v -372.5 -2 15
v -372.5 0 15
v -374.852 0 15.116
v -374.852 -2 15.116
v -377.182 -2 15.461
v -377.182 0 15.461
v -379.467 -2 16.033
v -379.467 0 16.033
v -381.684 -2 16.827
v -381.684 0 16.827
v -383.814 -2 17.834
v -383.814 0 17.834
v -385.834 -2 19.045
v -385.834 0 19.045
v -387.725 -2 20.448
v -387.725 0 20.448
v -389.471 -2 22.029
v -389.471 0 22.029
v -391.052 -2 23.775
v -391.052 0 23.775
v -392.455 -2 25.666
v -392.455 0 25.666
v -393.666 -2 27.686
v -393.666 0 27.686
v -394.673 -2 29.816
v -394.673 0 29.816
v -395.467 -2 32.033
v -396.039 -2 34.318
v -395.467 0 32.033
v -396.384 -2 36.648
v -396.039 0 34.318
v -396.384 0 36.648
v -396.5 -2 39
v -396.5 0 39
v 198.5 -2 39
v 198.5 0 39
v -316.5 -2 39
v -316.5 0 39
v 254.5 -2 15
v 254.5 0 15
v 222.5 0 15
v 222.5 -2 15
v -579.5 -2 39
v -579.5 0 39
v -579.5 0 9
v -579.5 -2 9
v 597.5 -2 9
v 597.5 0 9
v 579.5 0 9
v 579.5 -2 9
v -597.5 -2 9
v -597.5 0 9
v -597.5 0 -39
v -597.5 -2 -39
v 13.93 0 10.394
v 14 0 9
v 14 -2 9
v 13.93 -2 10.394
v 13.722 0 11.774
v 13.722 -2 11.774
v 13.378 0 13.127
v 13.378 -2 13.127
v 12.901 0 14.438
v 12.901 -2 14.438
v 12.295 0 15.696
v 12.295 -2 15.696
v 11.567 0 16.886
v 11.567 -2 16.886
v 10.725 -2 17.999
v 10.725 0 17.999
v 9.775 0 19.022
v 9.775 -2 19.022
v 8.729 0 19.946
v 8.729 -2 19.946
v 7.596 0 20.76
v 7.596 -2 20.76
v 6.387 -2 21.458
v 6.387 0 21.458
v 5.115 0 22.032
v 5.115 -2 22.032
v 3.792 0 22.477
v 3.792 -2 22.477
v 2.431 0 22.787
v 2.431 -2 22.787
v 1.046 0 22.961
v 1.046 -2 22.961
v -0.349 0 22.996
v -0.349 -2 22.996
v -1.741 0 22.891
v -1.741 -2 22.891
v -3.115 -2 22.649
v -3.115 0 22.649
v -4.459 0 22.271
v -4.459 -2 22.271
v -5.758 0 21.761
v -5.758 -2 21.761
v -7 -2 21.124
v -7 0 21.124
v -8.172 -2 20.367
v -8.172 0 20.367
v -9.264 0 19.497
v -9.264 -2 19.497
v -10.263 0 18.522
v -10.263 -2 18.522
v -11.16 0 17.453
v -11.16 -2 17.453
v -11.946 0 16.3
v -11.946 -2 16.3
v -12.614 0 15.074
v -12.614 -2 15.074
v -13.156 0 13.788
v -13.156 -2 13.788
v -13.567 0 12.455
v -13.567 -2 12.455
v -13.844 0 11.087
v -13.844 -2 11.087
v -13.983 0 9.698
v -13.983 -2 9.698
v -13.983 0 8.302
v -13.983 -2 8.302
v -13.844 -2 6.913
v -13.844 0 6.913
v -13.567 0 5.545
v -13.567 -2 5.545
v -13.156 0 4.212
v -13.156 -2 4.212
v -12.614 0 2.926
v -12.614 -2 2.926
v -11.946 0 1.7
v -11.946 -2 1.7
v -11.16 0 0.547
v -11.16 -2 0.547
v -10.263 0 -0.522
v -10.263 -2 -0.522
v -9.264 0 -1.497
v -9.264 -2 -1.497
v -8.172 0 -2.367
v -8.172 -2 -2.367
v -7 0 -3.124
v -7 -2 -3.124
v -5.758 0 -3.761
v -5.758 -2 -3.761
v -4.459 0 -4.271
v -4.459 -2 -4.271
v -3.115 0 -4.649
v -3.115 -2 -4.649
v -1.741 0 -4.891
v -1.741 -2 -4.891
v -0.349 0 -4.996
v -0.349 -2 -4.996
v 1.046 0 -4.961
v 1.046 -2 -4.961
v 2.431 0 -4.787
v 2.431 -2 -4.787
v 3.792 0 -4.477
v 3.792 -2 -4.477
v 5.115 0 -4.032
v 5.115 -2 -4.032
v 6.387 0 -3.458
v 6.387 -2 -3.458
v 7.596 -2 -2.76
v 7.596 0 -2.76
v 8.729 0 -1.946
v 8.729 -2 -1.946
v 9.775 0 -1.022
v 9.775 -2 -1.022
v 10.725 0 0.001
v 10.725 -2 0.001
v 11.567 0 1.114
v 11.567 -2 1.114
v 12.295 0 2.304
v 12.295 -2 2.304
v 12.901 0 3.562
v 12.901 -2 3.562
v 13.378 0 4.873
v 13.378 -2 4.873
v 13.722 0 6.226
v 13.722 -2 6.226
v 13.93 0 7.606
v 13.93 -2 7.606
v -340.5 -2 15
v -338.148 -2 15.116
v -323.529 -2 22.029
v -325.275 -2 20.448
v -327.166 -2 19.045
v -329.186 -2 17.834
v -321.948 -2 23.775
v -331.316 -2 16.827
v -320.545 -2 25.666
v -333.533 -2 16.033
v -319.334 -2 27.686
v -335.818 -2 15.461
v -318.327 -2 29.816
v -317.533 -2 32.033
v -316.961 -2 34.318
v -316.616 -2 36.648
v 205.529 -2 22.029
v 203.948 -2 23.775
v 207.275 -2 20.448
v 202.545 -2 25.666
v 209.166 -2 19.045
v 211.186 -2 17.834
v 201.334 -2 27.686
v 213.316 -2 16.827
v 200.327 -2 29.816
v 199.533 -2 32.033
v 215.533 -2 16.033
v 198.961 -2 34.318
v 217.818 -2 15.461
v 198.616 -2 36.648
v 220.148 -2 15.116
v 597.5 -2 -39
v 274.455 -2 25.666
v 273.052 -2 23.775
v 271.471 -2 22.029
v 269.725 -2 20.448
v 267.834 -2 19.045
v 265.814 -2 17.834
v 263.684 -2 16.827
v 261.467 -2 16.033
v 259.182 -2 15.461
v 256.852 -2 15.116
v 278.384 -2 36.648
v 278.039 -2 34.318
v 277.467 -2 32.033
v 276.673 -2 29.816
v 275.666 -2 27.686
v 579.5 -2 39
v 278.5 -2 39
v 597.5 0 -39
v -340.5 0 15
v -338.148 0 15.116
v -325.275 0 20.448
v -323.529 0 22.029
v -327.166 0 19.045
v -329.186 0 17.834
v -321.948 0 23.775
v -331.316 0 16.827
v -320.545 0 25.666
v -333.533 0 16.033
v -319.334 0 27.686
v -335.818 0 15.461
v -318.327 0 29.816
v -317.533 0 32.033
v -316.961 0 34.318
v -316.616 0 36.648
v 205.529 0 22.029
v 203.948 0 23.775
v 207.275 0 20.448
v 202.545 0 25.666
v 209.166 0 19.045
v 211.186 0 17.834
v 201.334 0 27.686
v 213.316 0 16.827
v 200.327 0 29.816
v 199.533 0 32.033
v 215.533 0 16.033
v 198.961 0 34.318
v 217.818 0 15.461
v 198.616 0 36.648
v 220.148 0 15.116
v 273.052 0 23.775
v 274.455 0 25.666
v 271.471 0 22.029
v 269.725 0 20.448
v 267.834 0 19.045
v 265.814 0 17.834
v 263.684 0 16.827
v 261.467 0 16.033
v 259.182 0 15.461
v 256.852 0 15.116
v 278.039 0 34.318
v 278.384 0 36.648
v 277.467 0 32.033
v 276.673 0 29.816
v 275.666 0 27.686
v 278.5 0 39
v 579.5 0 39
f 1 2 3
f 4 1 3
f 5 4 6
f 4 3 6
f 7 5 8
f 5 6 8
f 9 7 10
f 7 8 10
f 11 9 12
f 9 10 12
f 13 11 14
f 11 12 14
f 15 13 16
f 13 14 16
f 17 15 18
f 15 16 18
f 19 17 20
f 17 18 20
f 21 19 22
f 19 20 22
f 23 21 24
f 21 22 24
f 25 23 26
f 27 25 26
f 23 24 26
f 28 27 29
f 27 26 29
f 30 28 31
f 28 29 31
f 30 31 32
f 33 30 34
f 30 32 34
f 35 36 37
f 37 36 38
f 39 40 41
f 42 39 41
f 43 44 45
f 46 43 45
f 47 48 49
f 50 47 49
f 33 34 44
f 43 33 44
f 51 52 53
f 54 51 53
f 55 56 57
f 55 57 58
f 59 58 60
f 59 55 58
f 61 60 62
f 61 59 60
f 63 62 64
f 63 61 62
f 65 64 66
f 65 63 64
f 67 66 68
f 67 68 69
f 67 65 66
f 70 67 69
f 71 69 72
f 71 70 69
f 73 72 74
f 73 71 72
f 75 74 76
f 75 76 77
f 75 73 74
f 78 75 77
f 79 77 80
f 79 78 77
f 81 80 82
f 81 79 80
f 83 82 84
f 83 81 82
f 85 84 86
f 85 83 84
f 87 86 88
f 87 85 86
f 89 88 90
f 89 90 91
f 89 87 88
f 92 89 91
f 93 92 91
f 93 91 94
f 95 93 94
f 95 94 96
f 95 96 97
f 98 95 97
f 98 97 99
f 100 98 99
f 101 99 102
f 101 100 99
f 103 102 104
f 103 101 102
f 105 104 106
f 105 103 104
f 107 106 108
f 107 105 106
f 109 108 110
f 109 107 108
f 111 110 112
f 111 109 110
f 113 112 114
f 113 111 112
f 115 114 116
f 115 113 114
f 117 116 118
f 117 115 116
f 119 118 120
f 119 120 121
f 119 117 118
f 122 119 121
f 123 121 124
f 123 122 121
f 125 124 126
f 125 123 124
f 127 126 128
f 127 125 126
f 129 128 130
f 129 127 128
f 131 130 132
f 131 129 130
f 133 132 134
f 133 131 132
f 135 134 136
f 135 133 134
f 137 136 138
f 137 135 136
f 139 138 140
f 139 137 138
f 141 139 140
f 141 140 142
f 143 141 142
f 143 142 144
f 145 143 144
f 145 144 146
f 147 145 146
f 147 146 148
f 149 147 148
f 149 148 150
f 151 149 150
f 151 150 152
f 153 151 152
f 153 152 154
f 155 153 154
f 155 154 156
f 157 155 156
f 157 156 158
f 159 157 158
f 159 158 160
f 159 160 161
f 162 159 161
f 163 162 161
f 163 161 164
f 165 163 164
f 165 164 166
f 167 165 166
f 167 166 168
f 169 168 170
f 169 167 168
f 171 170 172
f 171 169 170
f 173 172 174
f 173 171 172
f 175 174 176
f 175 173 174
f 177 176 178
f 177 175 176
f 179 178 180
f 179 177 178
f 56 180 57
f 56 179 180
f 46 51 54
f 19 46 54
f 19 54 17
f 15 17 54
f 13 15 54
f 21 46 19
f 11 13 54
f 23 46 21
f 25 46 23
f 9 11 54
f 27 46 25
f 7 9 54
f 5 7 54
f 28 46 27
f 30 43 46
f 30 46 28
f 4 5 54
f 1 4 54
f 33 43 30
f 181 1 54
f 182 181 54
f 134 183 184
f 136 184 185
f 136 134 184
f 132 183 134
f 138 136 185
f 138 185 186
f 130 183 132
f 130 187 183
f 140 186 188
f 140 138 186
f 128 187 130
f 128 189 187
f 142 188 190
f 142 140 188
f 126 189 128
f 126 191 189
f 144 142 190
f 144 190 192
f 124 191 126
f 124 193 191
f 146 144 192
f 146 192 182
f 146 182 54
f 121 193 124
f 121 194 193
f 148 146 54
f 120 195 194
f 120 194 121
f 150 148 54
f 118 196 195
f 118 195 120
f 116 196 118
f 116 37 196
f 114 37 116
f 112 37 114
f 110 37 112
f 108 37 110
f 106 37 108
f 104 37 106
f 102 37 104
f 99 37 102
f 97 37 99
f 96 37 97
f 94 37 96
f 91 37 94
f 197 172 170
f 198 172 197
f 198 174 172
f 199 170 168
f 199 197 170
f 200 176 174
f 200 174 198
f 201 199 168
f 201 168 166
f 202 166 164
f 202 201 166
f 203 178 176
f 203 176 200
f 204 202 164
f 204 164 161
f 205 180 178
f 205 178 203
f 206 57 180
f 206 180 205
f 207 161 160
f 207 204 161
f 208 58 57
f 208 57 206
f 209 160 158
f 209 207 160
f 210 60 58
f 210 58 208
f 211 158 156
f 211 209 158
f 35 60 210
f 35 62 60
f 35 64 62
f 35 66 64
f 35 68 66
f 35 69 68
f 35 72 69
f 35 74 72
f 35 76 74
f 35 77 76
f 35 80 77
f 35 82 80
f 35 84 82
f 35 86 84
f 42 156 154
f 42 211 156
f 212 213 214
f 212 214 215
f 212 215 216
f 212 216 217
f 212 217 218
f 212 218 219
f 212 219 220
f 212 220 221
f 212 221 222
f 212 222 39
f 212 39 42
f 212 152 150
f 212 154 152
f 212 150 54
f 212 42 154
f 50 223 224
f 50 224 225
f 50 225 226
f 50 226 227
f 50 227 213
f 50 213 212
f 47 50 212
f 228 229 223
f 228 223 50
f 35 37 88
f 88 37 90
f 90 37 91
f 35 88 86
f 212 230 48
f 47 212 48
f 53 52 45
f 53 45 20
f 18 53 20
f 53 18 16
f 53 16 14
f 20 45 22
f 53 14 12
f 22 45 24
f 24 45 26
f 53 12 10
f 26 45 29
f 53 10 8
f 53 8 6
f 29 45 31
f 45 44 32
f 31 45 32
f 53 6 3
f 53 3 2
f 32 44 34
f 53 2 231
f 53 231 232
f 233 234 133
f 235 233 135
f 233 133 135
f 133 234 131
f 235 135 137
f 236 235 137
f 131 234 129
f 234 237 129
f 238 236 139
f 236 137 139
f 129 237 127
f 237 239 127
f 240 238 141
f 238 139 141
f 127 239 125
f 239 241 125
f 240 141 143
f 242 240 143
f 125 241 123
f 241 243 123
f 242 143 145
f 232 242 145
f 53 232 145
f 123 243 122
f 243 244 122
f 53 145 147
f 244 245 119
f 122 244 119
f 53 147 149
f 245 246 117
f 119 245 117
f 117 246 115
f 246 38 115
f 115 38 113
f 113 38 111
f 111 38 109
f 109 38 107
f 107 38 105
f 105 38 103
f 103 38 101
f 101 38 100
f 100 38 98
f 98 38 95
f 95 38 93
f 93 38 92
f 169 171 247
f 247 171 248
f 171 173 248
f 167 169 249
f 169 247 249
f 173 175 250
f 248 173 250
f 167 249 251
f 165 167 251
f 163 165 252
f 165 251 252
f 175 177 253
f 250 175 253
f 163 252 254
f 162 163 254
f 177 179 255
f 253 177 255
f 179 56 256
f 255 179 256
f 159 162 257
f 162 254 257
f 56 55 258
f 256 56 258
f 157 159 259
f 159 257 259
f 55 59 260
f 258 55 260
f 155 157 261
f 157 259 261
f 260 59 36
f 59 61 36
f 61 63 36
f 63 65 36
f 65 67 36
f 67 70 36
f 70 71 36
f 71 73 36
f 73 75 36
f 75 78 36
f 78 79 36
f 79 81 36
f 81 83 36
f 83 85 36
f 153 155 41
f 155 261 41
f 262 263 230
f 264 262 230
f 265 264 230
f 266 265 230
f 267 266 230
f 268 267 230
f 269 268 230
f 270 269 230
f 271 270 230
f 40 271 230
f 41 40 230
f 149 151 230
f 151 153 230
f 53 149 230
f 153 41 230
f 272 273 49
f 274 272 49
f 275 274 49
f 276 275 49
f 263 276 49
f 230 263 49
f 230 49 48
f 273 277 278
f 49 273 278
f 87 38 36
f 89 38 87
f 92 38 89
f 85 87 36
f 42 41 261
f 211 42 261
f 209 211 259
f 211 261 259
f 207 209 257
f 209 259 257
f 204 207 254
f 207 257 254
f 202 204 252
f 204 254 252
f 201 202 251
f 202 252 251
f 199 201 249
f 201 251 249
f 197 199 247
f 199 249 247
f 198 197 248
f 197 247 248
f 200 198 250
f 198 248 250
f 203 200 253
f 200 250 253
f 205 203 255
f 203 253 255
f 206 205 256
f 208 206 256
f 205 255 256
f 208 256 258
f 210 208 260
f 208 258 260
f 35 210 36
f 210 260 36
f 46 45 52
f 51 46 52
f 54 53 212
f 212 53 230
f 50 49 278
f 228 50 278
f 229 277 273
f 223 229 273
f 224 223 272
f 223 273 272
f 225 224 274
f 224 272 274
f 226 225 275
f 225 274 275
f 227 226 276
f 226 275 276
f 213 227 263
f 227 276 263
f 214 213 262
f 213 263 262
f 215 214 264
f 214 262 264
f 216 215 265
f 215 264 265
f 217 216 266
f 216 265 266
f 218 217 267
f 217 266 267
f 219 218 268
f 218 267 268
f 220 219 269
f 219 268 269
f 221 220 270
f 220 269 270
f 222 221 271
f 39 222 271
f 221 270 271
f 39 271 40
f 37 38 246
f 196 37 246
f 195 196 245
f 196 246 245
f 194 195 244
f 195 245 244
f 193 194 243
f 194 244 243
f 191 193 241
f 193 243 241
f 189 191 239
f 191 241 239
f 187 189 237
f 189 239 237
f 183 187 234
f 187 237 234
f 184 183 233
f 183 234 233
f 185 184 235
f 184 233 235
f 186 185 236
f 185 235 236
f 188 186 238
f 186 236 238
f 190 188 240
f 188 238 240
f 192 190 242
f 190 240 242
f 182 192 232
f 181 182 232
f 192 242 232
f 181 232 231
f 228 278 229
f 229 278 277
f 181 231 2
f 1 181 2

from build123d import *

# Parameters (mm, degrees)
F0_R     = 14
F1_DEPTH = 2


with BuildPart() as f1:
    # F0 (on Front) → F1 (new body)
    with BuildSketch(Plane.XZ):
        with BuildLine():
            Line((-597.5, -39), (597.5, -39))
            Line((597.5, -39), (597.5, 9))
            Line((597.5, 9), (579.5, 9))
            Line((579.5, 9), (579.5, 39))
            Line((579.5, 39), (278.5, 39))
            ThreePointArc((278.5, 39), (271.470563, 22.029437), (254.5, 15))
            Line((254.5, 15), (222.5, 15))
            ThreePointArc((222.5, 15), (205.529437, 22.029437), (198.5, 39))
            Line((198.5, 39), (-316.5, 39))
            ThreePointArc((-316.5, 39), (-323.529437, 22.029437), (-340.5, 15))
            Line((-340.5, 15), (-372.5, 15))
            ThreePointArc((-372.5, 15), (-389.470563, 22.029437), (-396.5, 39))
            Line((-396.5, 39), (-579.5, 39))
            Line((-579.5, 39), (-579.5, 9))
            Line((-579.5, 9), (-597.5, 9))
            Line((-597.5, 9), (-597.5, -39))
        make_face()
        with Locations((0, 9)):
            Circle(F0_R, mode=Mode.SUBTRACT)
    extrude(amount=F1_DEPTH)


solid = f1.part
